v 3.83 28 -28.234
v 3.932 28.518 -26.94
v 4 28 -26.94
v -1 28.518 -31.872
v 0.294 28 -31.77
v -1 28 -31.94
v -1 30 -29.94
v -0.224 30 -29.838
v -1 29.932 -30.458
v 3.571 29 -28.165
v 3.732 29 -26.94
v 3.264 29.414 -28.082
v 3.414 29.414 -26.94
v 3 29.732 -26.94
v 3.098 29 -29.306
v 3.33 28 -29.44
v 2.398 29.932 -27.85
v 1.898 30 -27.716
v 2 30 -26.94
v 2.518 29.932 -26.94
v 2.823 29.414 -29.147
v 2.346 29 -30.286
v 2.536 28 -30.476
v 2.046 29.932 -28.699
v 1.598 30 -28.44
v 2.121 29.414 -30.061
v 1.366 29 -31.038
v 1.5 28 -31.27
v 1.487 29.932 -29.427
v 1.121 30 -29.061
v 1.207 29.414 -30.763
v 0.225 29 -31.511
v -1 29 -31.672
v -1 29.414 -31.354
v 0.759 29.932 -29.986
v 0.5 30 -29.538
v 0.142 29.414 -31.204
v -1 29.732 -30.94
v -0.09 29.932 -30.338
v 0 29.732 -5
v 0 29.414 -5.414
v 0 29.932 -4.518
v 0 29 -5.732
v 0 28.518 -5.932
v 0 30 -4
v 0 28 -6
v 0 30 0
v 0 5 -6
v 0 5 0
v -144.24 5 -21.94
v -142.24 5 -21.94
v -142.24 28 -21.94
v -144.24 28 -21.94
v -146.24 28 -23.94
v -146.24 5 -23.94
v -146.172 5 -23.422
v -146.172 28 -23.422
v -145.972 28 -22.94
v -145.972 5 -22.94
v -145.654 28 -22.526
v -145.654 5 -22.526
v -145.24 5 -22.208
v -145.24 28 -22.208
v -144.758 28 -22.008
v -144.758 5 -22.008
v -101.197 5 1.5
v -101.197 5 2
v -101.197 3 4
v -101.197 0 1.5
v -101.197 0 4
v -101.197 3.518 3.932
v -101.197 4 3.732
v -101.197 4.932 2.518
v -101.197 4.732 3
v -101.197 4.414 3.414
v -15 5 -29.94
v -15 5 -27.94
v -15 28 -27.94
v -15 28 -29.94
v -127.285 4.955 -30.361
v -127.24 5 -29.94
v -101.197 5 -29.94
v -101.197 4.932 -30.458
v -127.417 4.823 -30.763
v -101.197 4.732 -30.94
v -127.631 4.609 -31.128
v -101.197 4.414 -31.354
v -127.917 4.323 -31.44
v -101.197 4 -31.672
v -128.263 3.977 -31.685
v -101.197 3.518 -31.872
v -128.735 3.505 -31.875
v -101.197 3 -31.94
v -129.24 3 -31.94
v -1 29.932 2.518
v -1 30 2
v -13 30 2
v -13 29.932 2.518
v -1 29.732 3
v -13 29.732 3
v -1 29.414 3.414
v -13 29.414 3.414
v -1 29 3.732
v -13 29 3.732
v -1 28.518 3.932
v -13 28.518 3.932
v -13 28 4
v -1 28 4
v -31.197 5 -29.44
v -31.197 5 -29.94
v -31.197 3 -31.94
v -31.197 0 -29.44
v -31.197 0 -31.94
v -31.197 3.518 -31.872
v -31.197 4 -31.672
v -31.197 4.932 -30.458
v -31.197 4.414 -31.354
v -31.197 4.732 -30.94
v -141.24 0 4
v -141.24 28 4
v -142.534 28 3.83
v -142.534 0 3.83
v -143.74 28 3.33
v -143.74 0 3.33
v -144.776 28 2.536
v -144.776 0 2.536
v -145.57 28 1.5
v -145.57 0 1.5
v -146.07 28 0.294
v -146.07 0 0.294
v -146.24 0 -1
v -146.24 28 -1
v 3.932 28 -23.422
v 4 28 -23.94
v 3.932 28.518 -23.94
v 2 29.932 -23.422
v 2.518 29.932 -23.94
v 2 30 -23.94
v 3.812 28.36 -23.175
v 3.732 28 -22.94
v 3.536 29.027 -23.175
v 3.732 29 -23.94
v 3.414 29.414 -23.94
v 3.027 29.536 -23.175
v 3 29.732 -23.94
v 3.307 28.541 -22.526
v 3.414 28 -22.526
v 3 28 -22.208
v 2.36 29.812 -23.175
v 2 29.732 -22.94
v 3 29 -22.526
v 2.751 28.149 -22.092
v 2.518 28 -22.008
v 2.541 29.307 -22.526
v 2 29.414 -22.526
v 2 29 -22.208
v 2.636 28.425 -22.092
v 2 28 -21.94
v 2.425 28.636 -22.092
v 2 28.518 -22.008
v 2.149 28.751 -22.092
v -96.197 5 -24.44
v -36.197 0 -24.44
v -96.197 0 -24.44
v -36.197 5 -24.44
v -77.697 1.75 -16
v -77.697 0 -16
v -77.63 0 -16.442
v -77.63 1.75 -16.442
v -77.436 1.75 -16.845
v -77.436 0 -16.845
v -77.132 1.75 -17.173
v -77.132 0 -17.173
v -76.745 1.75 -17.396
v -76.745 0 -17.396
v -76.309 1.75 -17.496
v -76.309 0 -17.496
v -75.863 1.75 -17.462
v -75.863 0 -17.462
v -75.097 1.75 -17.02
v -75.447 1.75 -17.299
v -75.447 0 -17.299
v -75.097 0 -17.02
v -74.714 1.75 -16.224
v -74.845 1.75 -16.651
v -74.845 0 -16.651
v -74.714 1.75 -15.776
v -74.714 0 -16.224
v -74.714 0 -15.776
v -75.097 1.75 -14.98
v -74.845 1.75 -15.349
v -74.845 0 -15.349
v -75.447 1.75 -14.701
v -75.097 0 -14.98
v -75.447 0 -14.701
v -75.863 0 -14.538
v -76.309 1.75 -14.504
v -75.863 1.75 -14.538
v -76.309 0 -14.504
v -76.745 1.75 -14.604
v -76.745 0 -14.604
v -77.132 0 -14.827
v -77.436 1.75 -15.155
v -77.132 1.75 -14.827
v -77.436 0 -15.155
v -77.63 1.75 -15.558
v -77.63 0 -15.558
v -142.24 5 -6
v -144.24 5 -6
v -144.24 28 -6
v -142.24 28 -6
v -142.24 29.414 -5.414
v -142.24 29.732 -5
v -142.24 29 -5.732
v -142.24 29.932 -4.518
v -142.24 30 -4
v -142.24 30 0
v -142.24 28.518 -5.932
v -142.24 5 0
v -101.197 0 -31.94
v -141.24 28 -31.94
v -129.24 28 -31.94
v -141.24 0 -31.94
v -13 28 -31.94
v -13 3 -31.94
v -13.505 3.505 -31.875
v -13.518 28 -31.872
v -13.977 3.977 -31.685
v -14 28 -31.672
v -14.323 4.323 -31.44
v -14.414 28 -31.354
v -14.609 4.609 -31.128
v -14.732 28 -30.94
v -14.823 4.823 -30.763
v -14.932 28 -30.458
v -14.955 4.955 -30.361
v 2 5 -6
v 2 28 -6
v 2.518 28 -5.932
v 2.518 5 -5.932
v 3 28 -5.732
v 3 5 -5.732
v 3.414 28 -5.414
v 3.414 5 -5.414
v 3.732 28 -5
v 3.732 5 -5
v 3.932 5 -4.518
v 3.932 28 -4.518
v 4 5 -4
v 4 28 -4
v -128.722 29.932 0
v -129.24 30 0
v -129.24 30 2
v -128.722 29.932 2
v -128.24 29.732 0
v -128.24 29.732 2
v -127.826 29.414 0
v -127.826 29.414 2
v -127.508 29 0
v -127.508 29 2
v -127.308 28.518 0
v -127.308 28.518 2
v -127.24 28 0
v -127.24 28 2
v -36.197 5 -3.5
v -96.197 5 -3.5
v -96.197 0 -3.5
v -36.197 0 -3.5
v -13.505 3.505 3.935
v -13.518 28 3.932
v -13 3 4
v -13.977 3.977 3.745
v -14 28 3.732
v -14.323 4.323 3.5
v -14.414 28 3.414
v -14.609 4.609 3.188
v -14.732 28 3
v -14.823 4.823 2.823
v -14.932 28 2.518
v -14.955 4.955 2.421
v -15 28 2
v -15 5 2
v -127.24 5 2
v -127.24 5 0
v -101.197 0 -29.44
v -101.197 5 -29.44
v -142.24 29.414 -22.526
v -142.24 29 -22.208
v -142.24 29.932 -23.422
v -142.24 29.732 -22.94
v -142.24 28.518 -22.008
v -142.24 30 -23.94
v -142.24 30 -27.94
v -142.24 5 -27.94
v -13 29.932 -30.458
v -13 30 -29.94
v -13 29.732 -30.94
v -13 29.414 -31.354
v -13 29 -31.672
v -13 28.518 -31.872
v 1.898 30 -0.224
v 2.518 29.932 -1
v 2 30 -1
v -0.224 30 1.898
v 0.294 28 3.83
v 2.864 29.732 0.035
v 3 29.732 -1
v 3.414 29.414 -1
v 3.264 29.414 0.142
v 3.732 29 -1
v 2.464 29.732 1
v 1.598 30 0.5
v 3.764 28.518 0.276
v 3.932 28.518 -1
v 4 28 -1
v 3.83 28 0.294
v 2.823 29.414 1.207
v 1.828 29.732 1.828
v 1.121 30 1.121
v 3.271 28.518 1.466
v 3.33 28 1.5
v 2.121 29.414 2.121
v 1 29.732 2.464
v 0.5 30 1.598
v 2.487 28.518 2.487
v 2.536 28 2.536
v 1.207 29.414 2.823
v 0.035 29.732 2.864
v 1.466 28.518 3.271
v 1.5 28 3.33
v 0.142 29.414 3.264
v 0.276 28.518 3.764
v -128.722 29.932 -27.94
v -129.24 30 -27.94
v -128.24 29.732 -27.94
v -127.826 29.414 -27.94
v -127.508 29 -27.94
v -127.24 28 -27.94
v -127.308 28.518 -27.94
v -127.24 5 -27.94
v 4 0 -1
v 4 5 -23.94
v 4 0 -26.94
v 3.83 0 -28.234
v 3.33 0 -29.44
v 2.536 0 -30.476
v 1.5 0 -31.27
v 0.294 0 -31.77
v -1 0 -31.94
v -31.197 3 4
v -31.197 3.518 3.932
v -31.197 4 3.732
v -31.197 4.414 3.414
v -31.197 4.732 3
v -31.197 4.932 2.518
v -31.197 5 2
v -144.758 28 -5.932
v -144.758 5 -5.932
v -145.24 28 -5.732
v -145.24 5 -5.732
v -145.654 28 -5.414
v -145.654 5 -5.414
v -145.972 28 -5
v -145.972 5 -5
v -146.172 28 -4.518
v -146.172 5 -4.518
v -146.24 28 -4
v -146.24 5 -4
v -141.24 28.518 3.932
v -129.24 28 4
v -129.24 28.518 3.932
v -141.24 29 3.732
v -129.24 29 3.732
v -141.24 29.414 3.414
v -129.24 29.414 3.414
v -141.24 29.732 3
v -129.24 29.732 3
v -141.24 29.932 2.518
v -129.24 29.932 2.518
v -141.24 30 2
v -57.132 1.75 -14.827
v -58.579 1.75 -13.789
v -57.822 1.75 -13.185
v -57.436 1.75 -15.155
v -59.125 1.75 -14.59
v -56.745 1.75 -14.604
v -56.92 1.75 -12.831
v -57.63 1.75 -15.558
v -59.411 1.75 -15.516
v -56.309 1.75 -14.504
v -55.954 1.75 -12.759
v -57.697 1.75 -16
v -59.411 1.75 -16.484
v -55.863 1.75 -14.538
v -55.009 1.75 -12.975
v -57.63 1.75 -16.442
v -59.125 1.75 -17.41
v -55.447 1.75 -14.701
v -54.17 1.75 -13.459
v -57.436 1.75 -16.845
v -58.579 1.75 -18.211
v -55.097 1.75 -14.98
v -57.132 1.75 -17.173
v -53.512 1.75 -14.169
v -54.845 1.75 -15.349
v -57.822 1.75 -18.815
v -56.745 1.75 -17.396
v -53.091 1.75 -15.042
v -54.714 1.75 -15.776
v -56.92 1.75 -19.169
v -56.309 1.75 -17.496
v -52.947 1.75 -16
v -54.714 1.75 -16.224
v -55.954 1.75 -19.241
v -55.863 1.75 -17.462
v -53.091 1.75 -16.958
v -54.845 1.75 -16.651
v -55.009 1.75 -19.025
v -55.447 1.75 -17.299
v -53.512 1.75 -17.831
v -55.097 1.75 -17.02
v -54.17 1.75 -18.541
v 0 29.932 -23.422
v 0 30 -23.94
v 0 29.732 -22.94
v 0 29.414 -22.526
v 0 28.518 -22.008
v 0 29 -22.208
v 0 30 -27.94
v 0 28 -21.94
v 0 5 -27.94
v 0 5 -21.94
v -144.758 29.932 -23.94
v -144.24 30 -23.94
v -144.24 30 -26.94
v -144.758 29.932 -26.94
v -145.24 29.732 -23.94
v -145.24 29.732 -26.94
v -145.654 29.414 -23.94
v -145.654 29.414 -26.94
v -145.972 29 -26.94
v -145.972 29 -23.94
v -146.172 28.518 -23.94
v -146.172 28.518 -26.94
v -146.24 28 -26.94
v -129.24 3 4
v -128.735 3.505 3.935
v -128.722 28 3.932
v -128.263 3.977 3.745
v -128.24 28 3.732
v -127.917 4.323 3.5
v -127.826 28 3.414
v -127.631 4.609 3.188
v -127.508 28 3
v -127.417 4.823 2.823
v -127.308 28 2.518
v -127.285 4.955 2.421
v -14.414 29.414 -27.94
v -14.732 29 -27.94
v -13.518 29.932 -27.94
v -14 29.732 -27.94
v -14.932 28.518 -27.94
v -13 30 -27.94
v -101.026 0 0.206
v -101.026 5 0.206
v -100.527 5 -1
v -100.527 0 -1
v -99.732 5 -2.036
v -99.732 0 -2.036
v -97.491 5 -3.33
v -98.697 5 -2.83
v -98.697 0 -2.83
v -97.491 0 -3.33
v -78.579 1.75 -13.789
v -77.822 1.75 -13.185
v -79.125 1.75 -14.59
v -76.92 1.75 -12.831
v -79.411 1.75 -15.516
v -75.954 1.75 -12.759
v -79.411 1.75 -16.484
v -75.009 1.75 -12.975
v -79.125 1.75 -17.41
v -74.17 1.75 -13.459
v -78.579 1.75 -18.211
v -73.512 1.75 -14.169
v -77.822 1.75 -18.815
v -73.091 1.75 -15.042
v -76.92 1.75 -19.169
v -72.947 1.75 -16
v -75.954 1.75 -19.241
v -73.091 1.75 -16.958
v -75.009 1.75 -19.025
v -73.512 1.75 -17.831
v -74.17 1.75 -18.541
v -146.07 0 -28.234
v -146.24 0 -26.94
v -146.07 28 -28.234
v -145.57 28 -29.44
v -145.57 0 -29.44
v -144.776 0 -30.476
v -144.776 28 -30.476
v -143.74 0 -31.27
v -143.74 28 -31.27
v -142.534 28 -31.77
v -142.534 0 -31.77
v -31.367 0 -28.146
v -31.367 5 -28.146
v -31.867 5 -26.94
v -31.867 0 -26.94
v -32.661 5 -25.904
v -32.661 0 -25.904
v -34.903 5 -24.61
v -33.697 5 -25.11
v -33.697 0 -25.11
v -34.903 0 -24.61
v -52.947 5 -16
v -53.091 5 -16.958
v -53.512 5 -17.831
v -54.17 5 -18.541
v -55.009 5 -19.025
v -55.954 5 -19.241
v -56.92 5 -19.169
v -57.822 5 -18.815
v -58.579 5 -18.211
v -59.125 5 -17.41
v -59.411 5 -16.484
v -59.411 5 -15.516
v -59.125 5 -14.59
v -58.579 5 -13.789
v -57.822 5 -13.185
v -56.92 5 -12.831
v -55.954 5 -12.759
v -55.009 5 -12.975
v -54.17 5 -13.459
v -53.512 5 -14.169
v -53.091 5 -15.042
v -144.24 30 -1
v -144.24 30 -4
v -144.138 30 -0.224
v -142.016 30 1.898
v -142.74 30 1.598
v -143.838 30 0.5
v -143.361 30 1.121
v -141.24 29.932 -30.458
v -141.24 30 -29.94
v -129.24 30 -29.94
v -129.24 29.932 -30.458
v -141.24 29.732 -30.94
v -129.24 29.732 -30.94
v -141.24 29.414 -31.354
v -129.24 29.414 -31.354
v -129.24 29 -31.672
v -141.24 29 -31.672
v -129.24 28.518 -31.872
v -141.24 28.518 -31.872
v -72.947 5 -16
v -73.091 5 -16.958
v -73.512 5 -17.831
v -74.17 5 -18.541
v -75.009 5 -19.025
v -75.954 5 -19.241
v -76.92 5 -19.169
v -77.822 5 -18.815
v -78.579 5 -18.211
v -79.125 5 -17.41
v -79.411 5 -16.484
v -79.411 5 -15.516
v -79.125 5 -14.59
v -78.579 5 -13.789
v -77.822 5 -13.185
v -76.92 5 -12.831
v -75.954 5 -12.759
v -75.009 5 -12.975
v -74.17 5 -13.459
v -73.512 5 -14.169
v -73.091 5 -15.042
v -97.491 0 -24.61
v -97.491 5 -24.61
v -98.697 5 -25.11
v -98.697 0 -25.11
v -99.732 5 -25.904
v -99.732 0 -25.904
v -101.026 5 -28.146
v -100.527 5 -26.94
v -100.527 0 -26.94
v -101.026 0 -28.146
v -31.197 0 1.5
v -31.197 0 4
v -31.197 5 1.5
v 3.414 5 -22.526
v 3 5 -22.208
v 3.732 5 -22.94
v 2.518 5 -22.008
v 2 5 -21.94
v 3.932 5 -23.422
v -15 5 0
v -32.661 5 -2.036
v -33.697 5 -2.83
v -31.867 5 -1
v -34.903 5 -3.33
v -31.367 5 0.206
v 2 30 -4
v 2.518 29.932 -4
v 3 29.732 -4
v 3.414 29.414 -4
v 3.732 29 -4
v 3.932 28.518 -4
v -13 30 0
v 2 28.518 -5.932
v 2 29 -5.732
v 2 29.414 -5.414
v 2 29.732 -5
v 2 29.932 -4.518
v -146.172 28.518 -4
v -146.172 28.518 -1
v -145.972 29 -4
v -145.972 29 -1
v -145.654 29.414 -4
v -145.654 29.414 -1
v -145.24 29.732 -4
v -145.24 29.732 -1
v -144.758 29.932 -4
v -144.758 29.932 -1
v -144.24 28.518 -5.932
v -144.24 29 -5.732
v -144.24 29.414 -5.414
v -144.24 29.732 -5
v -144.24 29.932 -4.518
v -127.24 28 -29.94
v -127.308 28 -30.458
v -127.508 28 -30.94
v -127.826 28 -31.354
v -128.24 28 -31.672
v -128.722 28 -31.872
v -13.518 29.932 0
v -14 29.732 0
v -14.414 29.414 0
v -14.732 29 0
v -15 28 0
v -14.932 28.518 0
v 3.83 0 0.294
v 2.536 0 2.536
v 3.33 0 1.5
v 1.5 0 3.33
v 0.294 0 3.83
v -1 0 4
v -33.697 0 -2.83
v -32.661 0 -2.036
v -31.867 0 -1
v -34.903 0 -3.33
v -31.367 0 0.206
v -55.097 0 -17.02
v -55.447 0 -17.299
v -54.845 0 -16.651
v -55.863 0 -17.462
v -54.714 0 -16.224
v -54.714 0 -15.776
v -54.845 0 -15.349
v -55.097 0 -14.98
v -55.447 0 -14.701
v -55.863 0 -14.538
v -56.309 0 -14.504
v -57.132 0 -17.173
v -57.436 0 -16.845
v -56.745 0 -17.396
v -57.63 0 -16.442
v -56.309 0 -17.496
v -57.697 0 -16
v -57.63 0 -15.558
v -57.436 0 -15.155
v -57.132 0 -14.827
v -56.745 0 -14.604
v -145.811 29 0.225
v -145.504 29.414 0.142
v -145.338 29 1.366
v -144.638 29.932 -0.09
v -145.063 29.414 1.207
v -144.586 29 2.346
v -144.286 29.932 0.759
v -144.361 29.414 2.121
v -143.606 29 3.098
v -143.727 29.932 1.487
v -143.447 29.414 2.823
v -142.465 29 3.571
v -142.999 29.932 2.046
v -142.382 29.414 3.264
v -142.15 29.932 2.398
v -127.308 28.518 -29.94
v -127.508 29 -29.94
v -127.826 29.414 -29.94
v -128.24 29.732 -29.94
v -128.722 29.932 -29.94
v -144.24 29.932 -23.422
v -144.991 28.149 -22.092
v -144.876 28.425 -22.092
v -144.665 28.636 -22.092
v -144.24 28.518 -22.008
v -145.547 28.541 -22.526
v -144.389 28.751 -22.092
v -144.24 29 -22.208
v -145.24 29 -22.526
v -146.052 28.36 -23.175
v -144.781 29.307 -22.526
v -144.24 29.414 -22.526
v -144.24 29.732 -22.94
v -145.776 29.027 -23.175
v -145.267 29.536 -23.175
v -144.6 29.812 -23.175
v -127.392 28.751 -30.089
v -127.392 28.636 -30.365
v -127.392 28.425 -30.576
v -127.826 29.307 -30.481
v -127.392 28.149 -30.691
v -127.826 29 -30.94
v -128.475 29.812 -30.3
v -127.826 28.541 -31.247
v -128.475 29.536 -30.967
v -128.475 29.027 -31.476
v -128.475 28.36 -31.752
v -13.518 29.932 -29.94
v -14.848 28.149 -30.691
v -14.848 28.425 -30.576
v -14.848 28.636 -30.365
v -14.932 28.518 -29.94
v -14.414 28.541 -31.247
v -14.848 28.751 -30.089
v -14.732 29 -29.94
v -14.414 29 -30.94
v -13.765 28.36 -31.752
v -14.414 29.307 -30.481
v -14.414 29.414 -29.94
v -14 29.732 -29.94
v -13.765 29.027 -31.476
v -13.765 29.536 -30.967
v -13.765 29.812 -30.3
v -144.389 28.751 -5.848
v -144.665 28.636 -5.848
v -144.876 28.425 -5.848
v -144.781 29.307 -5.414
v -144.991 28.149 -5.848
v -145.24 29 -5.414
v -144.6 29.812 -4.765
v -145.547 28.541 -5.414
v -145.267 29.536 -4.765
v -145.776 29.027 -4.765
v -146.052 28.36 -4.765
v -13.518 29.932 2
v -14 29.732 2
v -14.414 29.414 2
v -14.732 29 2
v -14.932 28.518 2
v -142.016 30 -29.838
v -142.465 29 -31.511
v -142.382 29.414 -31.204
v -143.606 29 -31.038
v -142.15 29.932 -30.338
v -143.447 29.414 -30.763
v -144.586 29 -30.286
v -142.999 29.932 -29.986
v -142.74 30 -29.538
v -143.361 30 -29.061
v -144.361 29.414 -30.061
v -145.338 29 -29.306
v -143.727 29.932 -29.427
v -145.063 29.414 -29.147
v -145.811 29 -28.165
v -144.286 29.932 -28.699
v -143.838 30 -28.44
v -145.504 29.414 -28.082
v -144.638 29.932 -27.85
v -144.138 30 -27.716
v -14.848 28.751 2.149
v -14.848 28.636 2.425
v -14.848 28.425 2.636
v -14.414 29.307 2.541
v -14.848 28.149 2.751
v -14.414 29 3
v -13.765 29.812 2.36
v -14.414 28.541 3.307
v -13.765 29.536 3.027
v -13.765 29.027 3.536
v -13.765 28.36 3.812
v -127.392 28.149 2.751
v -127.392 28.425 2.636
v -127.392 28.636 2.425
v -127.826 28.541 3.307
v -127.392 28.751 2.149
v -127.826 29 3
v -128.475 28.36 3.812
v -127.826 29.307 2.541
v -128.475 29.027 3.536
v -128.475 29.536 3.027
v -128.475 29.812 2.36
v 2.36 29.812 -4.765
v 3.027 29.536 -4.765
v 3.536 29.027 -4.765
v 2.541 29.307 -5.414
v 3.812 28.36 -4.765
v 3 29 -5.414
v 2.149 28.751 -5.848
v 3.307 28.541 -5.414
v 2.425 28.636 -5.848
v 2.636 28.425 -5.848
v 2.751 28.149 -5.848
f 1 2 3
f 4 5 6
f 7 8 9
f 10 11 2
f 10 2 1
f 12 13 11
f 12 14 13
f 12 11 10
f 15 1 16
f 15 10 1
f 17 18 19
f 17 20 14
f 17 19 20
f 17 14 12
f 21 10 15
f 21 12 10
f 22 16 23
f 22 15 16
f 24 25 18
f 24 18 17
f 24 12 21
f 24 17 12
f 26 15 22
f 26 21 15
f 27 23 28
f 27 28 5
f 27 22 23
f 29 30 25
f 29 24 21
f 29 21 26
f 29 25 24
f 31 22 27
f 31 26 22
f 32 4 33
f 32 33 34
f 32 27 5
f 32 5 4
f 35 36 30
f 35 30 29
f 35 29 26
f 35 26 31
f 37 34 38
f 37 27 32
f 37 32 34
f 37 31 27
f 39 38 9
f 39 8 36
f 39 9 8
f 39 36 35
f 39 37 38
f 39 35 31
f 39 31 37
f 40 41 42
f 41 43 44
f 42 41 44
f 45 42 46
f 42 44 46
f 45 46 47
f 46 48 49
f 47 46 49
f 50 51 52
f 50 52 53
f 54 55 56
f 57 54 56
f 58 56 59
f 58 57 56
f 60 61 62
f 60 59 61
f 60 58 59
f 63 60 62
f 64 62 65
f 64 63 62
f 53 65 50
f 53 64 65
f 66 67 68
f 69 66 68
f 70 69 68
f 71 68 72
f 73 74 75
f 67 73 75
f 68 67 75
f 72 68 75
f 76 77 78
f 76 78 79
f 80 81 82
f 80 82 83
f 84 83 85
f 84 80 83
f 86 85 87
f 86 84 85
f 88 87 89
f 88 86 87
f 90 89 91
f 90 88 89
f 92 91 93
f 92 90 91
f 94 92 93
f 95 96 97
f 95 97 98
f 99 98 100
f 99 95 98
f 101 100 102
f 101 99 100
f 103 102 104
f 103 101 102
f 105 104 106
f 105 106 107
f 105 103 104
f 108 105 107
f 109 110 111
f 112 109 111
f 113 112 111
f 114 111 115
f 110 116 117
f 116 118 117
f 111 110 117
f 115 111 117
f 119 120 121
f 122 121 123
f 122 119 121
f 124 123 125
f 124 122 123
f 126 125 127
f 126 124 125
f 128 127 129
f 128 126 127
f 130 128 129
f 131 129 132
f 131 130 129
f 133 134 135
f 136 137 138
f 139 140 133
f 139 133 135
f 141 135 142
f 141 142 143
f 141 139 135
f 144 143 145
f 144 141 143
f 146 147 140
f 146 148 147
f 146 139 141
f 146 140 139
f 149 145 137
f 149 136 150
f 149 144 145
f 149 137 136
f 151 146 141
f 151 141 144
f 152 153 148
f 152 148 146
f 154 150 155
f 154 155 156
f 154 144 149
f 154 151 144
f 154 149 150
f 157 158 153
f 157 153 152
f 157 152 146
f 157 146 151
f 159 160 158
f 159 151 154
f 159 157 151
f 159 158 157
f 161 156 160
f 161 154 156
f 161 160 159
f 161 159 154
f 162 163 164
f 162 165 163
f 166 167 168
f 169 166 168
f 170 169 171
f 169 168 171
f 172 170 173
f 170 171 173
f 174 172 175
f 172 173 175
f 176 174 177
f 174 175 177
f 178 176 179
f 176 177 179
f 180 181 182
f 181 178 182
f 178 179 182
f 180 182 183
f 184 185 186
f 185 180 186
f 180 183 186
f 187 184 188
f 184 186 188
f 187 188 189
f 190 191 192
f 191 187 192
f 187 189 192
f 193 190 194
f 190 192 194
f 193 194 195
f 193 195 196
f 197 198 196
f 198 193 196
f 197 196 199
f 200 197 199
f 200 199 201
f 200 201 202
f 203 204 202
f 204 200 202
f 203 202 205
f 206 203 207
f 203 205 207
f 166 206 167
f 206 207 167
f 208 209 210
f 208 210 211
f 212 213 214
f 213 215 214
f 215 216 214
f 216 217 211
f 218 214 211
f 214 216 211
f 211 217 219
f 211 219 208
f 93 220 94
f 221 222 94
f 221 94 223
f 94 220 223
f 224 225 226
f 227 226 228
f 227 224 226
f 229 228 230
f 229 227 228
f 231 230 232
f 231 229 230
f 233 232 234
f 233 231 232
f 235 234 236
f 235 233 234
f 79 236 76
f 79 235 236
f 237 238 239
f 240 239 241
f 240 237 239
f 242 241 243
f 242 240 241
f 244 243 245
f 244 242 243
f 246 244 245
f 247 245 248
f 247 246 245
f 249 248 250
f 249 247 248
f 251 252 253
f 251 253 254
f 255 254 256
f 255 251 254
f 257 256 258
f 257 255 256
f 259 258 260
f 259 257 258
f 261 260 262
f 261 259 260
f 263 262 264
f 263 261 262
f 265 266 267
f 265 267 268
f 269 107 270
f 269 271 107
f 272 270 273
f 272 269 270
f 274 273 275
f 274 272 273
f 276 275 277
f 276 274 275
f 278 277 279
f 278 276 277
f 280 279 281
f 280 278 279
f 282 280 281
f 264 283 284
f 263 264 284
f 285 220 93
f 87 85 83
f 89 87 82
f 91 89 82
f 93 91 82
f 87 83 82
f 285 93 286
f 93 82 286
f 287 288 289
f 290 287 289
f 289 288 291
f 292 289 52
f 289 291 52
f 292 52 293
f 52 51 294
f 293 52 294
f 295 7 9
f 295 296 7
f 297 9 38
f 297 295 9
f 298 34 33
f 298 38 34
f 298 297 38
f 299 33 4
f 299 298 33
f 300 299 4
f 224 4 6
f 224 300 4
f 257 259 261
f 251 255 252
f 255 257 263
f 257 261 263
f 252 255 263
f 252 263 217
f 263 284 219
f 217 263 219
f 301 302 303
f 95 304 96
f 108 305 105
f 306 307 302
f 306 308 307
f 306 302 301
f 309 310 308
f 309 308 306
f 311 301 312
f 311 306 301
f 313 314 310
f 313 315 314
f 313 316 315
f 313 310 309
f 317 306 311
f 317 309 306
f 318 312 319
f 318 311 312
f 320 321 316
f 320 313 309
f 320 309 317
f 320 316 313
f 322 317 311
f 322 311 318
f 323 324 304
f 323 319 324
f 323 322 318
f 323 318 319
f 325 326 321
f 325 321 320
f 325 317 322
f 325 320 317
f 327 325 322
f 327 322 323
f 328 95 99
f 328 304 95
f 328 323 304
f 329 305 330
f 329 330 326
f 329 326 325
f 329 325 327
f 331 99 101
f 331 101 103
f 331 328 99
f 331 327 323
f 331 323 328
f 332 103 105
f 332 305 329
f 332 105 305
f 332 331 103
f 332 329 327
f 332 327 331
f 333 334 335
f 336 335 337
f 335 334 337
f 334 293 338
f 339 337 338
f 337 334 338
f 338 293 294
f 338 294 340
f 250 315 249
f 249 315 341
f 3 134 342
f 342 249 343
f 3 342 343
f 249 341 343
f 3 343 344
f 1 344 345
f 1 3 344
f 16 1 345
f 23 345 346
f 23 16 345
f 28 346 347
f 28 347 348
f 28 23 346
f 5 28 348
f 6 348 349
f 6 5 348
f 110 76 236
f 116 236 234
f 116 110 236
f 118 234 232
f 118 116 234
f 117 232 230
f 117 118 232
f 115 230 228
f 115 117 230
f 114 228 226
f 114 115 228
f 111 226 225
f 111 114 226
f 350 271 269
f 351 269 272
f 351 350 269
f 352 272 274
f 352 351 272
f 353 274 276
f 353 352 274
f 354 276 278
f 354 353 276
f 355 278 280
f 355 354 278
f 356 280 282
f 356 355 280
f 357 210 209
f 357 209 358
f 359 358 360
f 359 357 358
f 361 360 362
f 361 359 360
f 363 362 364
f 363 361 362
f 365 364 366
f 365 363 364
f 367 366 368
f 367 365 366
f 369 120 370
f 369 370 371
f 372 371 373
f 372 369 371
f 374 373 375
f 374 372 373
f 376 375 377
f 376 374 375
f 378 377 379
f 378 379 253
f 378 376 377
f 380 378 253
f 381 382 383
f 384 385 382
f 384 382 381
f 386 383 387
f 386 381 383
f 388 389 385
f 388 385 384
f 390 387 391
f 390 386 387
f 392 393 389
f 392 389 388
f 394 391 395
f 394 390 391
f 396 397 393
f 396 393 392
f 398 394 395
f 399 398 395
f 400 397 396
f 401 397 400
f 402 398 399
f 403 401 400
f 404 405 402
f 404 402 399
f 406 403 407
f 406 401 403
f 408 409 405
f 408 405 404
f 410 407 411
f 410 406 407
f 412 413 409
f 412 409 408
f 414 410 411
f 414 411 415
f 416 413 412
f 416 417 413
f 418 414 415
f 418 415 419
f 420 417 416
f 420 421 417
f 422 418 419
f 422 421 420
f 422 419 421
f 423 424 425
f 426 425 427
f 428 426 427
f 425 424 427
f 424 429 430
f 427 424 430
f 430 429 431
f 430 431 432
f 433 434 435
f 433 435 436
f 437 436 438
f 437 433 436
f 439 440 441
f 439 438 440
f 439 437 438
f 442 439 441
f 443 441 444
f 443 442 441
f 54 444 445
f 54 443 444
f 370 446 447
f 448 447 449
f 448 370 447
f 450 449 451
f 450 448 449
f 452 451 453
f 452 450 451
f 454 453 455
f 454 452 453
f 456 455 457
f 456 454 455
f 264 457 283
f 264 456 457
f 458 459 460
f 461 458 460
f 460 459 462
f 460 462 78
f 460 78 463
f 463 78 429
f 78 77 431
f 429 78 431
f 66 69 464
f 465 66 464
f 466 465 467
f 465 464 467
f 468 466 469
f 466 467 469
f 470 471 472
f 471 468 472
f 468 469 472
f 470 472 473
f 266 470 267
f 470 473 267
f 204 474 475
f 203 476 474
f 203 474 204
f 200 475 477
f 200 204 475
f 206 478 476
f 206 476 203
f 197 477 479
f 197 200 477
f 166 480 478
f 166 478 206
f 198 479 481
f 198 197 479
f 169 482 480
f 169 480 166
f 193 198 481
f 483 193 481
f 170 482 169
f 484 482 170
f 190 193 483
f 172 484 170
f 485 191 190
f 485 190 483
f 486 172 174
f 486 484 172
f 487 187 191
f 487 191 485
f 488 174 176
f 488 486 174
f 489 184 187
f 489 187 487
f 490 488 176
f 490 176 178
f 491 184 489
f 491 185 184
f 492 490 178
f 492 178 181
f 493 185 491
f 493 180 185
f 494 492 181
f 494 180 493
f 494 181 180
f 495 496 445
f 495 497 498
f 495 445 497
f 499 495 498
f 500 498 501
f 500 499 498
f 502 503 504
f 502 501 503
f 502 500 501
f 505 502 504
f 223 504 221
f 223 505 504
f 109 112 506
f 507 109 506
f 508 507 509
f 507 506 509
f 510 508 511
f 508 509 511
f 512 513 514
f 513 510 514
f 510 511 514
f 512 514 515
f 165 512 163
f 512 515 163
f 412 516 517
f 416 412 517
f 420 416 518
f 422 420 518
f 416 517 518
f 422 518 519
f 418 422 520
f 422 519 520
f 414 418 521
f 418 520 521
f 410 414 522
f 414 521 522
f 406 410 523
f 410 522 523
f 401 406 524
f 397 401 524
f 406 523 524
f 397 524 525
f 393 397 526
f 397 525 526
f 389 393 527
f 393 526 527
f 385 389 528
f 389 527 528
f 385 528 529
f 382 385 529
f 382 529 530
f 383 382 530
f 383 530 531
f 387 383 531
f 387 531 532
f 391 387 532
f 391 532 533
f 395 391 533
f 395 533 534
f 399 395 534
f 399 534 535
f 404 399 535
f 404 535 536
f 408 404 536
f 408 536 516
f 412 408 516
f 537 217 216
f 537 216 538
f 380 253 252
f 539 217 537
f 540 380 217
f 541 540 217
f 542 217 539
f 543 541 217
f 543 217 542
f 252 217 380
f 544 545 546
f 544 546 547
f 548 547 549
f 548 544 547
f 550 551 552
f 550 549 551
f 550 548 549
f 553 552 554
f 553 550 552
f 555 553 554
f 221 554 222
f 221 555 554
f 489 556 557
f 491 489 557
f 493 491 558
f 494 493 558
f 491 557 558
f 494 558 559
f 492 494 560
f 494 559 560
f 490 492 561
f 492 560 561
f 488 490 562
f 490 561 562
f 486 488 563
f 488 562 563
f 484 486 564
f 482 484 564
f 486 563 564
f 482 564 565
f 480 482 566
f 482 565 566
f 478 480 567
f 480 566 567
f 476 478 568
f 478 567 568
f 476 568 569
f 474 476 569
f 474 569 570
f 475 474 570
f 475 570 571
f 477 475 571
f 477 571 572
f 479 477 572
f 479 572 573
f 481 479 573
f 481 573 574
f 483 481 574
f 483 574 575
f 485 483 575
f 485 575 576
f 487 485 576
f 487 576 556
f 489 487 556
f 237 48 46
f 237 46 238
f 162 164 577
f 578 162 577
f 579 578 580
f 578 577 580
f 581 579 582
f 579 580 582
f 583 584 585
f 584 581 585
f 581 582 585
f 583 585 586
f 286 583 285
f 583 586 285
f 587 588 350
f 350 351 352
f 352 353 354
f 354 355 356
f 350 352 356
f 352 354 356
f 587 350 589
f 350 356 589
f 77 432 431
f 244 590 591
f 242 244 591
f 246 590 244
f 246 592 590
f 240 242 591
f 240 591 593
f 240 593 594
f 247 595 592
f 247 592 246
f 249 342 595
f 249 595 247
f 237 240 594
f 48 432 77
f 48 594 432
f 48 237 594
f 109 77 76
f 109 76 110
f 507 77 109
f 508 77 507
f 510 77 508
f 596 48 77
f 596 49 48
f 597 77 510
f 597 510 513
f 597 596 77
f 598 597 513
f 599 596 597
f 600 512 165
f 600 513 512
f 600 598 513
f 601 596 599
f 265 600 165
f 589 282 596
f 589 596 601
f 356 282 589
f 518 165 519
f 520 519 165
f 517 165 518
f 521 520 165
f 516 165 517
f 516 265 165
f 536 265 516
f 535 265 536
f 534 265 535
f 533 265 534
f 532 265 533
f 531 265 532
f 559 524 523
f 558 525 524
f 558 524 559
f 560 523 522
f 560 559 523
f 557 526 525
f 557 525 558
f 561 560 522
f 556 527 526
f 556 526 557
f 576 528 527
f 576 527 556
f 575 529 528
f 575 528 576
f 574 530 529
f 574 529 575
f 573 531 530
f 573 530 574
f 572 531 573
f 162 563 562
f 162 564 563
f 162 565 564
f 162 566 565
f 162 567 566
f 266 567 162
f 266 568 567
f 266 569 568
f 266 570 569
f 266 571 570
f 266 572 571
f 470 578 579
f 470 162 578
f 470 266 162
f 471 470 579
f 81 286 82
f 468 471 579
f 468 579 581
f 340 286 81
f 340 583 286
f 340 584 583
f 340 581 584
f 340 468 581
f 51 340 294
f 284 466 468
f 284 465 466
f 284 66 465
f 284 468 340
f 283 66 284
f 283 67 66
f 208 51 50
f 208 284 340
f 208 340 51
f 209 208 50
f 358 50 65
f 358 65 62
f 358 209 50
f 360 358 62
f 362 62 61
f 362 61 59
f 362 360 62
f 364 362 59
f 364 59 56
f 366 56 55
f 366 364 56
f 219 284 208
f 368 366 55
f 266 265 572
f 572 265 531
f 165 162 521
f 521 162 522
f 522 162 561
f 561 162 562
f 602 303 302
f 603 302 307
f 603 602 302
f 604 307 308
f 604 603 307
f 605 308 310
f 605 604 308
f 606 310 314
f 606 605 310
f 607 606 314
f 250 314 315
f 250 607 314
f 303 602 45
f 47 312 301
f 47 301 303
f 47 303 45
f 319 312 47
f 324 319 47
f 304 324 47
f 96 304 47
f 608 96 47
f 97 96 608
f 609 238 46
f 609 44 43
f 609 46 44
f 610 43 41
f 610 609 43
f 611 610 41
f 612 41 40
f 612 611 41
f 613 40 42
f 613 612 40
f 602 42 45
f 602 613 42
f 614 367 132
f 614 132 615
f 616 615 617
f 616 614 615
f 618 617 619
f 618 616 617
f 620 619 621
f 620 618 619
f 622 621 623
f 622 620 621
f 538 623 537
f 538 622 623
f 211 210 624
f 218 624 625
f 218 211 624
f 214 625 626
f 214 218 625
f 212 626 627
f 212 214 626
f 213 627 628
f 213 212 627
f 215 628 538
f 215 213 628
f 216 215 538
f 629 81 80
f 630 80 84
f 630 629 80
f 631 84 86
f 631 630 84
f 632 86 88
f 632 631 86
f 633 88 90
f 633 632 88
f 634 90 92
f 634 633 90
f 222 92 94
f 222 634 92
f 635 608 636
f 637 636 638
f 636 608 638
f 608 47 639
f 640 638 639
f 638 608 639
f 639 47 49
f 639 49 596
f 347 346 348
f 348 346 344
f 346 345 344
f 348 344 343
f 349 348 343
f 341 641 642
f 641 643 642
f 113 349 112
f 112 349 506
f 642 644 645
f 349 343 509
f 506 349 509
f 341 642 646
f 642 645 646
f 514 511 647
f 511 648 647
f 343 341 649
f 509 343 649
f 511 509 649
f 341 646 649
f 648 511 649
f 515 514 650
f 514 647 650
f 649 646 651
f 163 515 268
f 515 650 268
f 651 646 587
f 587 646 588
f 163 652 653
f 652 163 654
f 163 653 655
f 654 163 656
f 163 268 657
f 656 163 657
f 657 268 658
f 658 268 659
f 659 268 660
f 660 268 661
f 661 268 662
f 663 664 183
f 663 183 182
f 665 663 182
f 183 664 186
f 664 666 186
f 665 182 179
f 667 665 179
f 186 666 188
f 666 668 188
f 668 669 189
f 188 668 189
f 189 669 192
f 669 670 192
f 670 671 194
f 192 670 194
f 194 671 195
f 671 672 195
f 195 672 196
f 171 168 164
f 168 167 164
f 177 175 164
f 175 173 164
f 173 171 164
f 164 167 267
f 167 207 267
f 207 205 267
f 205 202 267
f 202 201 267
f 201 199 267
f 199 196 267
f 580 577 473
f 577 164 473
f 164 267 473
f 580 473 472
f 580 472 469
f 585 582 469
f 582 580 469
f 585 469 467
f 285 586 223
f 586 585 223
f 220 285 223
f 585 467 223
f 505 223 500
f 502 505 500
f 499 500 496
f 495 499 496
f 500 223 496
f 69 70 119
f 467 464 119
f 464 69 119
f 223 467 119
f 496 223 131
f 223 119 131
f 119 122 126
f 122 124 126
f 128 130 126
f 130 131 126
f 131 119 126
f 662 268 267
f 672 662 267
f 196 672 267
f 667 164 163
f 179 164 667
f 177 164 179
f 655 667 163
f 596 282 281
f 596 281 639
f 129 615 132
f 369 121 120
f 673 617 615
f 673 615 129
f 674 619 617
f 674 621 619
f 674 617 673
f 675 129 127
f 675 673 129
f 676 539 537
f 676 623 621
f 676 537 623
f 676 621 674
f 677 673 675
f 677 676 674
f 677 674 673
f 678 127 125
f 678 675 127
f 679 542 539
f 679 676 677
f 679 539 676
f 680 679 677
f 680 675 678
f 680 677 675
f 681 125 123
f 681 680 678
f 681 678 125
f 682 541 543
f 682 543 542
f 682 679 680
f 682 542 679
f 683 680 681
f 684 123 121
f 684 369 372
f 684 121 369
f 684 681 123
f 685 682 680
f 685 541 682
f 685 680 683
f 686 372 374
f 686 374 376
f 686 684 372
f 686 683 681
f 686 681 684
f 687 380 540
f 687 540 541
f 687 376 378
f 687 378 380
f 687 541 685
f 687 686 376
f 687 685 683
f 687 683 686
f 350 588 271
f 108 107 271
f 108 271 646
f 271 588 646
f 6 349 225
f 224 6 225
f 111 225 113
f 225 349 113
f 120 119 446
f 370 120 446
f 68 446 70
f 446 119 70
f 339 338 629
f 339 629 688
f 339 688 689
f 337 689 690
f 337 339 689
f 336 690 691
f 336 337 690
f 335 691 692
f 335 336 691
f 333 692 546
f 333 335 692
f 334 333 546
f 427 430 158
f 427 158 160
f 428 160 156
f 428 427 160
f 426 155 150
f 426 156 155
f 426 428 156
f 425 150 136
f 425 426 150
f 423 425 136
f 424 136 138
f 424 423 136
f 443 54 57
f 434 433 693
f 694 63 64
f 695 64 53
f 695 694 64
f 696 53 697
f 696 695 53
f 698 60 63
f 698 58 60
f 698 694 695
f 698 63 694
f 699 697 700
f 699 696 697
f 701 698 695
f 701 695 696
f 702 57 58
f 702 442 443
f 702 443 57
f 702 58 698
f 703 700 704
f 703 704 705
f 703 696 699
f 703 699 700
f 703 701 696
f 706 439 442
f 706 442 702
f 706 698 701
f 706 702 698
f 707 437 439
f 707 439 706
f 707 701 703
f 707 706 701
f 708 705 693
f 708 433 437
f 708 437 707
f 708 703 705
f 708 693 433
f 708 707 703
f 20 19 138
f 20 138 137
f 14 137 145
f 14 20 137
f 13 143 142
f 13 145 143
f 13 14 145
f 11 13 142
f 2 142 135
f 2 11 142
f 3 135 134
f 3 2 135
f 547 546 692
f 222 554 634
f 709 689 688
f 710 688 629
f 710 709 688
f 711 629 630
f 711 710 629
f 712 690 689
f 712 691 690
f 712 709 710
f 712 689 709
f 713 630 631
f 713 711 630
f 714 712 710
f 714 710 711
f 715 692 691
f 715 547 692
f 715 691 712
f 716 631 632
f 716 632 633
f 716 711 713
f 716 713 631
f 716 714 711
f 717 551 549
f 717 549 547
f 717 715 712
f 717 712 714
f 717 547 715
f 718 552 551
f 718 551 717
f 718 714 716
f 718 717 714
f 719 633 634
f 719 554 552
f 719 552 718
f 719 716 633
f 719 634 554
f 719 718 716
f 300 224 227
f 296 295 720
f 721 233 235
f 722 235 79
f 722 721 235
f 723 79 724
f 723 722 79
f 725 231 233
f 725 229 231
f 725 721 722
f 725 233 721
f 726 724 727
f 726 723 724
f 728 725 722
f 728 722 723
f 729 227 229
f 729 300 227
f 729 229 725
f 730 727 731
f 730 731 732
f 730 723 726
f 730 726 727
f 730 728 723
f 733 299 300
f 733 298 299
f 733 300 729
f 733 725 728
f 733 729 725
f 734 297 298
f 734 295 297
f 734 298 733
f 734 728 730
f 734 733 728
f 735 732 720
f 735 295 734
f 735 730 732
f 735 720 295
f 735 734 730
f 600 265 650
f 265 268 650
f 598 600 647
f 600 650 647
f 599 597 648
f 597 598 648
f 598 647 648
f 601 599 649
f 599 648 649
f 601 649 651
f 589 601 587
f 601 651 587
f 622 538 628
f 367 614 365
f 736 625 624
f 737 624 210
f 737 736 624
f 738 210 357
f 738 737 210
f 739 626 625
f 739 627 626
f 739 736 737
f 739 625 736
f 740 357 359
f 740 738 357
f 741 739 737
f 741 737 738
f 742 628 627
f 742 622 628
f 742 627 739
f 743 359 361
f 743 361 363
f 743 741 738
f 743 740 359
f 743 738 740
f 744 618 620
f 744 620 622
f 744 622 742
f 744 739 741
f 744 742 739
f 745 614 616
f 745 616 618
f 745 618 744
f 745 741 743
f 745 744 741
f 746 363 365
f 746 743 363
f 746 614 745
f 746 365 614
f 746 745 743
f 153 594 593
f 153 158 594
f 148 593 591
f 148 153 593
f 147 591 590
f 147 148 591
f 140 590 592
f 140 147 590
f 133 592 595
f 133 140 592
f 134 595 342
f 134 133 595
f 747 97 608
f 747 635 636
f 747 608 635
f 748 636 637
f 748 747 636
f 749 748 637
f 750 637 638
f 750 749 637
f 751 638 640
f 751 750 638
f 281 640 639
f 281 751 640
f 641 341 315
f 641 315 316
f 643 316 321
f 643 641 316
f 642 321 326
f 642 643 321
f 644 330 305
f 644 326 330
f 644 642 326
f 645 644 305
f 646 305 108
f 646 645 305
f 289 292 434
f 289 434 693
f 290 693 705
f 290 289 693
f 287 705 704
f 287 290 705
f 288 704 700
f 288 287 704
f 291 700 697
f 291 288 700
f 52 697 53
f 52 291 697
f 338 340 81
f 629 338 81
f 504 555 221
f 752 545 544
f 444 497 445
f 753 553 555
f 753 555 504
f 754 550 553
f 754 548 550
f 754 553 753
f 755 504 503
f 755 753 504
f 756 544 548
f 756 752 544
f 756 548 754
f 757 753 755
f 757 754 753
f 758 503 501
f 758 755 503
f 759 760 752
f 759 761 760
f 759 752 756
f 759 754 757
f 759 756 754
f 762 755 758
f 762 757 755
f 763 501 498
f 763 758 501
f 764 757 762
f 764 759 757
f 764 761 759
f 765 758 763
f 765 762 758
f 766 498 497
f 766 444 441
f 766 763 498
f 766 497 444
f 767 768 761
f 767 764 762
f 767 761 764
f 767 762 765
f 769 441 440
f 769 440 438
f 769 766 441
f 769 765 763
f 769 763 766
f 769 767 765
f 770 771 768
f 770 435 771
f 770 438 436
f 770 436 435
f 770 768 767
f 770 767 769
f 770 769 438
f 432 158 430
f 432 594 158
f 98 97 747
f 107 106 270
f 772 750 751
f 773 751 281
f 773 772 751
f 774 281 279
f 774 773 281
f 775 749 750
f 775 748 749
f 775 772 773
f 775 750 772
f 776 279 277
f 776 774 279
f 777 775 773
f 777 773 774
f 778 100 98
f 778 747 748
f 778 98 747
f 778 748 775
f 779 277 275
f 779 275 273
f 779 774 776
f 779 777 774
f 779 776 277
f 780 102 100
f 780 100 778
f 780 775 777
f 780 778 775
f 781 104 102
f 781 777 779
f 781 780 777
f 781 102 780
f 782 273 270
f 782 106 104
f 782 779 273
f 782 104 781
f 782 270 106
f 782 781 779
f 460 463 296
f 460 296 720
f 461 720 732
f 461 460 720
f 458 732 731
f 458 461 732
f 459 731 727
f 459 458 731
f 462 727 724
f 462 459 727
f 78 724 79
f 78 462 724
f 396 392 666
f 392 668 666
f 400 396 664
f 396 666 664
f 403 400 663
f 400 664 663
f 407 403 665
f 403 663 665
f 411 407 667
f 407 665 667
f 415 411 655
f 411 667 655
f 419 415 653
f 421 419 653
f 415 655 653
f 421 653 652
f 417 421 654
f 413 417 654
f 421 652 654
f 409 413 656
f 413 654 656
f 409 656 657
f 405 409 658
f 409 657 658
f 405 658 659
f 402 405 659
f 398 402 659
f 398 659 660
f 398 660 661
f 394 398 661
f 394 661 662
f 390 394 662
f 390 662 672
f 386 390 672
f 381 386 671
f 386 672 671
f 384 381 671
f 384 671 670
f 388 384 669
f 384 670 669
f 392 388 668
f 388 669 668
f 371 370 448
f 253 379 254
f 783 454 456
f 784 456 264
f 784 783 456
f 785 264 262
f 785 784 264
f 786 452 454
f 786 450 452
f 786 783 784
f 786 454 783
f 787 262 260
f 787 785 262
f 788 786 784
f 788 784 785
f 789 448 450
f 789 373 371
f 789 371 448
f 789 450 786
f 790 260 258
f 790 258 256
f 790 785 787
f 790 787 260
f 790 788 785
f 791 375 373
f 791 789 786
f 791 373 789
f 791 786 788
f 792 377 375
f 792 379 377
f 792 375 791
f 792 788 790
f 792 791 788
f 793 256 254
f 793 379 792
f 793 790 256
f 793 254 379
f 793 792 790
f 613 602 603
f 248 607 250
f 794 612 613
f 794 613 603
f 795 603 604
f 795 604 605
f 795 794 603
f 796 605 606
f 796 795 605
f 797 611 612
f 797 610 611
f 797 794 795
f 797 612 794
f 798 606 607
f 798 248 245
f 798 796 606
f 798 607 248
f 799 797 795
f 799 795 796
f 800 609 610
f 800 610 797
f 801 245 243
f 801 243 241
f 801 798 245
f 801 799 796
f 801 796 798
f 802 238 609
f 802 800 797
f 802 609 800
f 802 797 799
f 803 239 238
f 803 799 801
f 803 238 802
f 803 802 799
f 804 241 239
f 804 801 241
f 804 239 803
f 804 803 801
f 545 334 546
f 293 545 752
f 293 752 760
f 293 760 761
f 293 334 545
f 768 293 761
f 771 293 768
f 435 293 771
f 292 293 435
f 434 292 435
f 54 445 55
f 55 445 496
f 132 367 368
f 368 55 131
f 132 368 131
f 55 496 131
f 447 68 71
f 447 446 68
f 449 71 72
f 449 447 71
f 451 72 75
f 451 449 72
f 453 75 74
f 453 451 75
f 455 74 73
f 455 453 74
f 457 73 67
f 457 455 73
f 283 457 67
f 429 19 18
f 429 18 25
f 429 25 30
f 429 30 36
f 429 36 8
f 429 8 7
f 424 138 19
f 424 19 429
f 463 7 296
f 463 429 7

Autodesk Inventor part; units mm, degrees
ref_plane "YZ Plane" through (0, 0, 0) normal (1, 0, 0) x (0, 1, 0)
ref_plane "XZ Plane" through (0, 0, 0) normal (0, 1, 0) x (-1, 0, 0)
ref_plane "XY Plane" through (0, 0, 0) normal (0, 0, 1) x (1, 0, 0)
sketch "Sketch1" plane through (0, 0, 0) normal (0, 1, 0) x (-1, 0, 0)
  line L0 (0, 0) -> (142.24, 0)
  line L1 (142.24, 0) -> (142.24, -27.94)
  line L2 (142.24, -27.94) -> (0, -27.94)
  line L3 (0, -27.94) -> (0, 0)
  circle A0 centre (76.1968, -16) radius 1.5
  circle A1 centre (56.1968, -16) radius 1.5
  line L4 (146.24, 4) -> (-4, 4)
  line L5 (-4, 4) -> (-4, -31.94)
  line L6 (-4, -31.94) -> (146.24, -31.94)
  line L7 (146.24, -31.94) -> (146.24, 4)
  line L8 (146.24, -6) -> (-4, -6)
  line L9 (-4, -21.94) -> (146.24, -21.94)
  line L10 (127.24, 4) -> (127.24, -31.94)
  line L11 (15, 4) -> (15, -31.94)
  point P0 (127.24, -27.94)
  point P1 (142.24, -21.94)
  point P2 (127.24, 0)
  point P3 (142.24, -6)
  point P4 (15, -27.94)
  point P5 (0, -21.94)
  point P6 (15, 0)
  point P7 (0, -6)
  dimension "d0" = 142.24
  dimension "d1" = 27.94
  dimension "d2" = 3
  dimension "d3" = 3
  dimension "d4" = 20
  dimension "d7" = 16
  dimension "d8" = 4
  dimension "d9" = 4
  dimension "d10" = 4
  dimension "d11" = 4
  dimension "d12" = 15
  dimension "d13" = 15
  dimension "d14" = 10
  dimension "d15" = 10
extrude "Extrusion1" add sketch "Sketch1" along normal blind 5
extrude "Extrusion2" add sketch "Sketch1" along normal blind 30 contours L3 L8 L5 L4 L11 L0 | L10 L4 L7 L8 L1 L0 | L3 L2 L11 L6 L5 L9 | L9 L7 L6 L10 L2 L1
sketch "Sketch2" plane through (0, 5, 0) normal (0, 1, 0) x (1, 0, 0)
  circle A0 centre (-56.1968, 16) radius 1.5 projected
  circle A1 centre (-76.1968, 16) radius 1.5 projected
  line L0 (-146.24, 6) -> (-142.24, 6) projected
  line L1 (-142.24, 6) -> (-142.24, 0) projected
  line L2 (-142.24, 0) -> (-127.24, 0) projected
  line L3 (-127.24, 0) -> (-127.24, -4) projected
  line L4 (-127.24, -4) -> (-15, -4) projected
  line L5 (-15, -4) -> (-15, 0) projected
  line L6 (-15, 0) -> (0, 0) projected
  line L7 (0, 0) -> (0, 6) projected
  line L8 (0, 6) -> (4, 6) projected
  line L9 (4, 6) -> (4, 21.94) projected
  line L10 (4, 21.94) -> (0, 21.94) projected
  line L11 (0, 21.94) -> (0, 27.94) projected
  line L12 (0, 27.94) -> (-15, 27.94) projected
  line L13 (-15, 27.94) -> (-15, 31.94) projected
  line L14 (-15, 31.94) -> (-127.24, 31.94) projected
  line L15 (-127.24, 31.94) -> (-127.24, 27.94) projected
  line L16 (-127.24, 27.94) -> (-142.24, 27.94) projected
  line L17 (-142.24, 27.94) -> (-142.24, 21.94) projected
  line L18 (-142.24, 21.94) -> (-146.24, 21.94) projected
  line L19 (-146.24, 21.94) -> (-146.24, 6) projected
  circle A2 centre (-76.1968, 16) radius 3.25
  circle A3 centre (-56.1968, 16) radius 3.25
  dimension "d20" = 6.5
  dimension "d21" = 6.5
extrude "Extrusion3" cut sketch "Sketch2" against normal blind 3.25 contours A0 | A2 | A3
fillet "Fillet1" radius 5 4 edges at (-146.24, 15, -31.94) (-146.24, 15, 4) (4, 15, -31.94) (4, 15, 4)
fillet "Fillet2" radius 2 12 edges at (-144.7755, 30, 2.5355) (-146.24, 30, -3.5) (-134.24, 30, 4) (-144.7755, 30, -30.4755) (-146.24, 30, -24.44) (-134.24, 30, -31.94) (4, 30, -24.44) (-8, 30, -31.94) (2.5355, 30, -30.4755) (-8, 30, 4) (4, 30, -3.5) (2.5355, 30, 2.5355)
fillet "Fillet3" radius 2 26 edges at (-71.12, 5, 4) (-71.12, 5, -31.94) (-127.24, 29.4142, -31.3542) (-127.24, 30, -28.94) (-127.24, 16.5, -31.94) (-127.24, 29.4142, 3.4142) (-127.24, 30, 1) (-127.24, 16.5, 4) (-15, 29.4142, 3.4142) (-15, 30, 1) (-15, 16.5, 4) (-15, 29.4142, -31.3542) (-15, 30, -28.94) (-15, 16.5, -31.94) (3.4142, 29.4142, -6) (1, 30, -6) (4, 16.5, -6) (3.4142, 29.4142, -21.94) (1, 30, -21.94) (4, 16.5, -21.94) (-145.6542, 29.4142, -21.94) (-143.24, 30, -21.94) (-146.24, 16.5, -21.94) (-145.6542, 29.4142, -6) (-143.24, 30, -6) (-146.24, 16.5, -6)
sketch "Sketch3" plane through (0, 5, 0) normal (0, 1, 0) x (1, 0, 0)
  line L0 (-141.24, -4) -> (-1, -4) projected
  line L1 (-1, 31.94) -> (-141.24, 31.94) projected
  line L2 (-101.1968, -4) -> (-31.1968, -4)
  line L3 (-31.1968, -4) -> (-31.1968, 31.94)
  line L4 (-31.1968, 31.94) -> (-101.1968, 31.94)
  line L5 (-101.1968, 31.94) -> (-101.1968, -4)
  circle A0 centre (-76.1968, 16) radius 1.5 projected
  circle A1 centre (-56.1968, 16) radius 1.5 projected
  line L6 (-101.1968, 3.5) -> (-31.1968, 3.5)
  line L7 (-31.1968, 3.5) -> (-31.1968, 24.44)
  line L8 (-31.1968, 24.44) -> (-101.1968, 24.44)
  line L9 (-101.1968, 24.44) -> (-101.1968, 3.5)
  point P0 (0, 0)
  point P1 (-31.1968, -4)
  dimension "d27" = 25
  dimension "d28" = 25
  dimension "d29" = 7.5
  dimension "d30" = 7.5
extrude "Extrusion4" cut sketch "Sketch3" against normal blind 18.75 contours L5 L6 L3 L0 | L5 L1 L3 L8
fillet "Fillet4" radius 5 4 edges at (-101.1968, 2.5, -3.5) (-31.1968, 2.5, -3.5) (-31.1968, 2.5, -24.44) (-101.1968, 2.5, -24.44)
properties part number "BatteryHolder"
